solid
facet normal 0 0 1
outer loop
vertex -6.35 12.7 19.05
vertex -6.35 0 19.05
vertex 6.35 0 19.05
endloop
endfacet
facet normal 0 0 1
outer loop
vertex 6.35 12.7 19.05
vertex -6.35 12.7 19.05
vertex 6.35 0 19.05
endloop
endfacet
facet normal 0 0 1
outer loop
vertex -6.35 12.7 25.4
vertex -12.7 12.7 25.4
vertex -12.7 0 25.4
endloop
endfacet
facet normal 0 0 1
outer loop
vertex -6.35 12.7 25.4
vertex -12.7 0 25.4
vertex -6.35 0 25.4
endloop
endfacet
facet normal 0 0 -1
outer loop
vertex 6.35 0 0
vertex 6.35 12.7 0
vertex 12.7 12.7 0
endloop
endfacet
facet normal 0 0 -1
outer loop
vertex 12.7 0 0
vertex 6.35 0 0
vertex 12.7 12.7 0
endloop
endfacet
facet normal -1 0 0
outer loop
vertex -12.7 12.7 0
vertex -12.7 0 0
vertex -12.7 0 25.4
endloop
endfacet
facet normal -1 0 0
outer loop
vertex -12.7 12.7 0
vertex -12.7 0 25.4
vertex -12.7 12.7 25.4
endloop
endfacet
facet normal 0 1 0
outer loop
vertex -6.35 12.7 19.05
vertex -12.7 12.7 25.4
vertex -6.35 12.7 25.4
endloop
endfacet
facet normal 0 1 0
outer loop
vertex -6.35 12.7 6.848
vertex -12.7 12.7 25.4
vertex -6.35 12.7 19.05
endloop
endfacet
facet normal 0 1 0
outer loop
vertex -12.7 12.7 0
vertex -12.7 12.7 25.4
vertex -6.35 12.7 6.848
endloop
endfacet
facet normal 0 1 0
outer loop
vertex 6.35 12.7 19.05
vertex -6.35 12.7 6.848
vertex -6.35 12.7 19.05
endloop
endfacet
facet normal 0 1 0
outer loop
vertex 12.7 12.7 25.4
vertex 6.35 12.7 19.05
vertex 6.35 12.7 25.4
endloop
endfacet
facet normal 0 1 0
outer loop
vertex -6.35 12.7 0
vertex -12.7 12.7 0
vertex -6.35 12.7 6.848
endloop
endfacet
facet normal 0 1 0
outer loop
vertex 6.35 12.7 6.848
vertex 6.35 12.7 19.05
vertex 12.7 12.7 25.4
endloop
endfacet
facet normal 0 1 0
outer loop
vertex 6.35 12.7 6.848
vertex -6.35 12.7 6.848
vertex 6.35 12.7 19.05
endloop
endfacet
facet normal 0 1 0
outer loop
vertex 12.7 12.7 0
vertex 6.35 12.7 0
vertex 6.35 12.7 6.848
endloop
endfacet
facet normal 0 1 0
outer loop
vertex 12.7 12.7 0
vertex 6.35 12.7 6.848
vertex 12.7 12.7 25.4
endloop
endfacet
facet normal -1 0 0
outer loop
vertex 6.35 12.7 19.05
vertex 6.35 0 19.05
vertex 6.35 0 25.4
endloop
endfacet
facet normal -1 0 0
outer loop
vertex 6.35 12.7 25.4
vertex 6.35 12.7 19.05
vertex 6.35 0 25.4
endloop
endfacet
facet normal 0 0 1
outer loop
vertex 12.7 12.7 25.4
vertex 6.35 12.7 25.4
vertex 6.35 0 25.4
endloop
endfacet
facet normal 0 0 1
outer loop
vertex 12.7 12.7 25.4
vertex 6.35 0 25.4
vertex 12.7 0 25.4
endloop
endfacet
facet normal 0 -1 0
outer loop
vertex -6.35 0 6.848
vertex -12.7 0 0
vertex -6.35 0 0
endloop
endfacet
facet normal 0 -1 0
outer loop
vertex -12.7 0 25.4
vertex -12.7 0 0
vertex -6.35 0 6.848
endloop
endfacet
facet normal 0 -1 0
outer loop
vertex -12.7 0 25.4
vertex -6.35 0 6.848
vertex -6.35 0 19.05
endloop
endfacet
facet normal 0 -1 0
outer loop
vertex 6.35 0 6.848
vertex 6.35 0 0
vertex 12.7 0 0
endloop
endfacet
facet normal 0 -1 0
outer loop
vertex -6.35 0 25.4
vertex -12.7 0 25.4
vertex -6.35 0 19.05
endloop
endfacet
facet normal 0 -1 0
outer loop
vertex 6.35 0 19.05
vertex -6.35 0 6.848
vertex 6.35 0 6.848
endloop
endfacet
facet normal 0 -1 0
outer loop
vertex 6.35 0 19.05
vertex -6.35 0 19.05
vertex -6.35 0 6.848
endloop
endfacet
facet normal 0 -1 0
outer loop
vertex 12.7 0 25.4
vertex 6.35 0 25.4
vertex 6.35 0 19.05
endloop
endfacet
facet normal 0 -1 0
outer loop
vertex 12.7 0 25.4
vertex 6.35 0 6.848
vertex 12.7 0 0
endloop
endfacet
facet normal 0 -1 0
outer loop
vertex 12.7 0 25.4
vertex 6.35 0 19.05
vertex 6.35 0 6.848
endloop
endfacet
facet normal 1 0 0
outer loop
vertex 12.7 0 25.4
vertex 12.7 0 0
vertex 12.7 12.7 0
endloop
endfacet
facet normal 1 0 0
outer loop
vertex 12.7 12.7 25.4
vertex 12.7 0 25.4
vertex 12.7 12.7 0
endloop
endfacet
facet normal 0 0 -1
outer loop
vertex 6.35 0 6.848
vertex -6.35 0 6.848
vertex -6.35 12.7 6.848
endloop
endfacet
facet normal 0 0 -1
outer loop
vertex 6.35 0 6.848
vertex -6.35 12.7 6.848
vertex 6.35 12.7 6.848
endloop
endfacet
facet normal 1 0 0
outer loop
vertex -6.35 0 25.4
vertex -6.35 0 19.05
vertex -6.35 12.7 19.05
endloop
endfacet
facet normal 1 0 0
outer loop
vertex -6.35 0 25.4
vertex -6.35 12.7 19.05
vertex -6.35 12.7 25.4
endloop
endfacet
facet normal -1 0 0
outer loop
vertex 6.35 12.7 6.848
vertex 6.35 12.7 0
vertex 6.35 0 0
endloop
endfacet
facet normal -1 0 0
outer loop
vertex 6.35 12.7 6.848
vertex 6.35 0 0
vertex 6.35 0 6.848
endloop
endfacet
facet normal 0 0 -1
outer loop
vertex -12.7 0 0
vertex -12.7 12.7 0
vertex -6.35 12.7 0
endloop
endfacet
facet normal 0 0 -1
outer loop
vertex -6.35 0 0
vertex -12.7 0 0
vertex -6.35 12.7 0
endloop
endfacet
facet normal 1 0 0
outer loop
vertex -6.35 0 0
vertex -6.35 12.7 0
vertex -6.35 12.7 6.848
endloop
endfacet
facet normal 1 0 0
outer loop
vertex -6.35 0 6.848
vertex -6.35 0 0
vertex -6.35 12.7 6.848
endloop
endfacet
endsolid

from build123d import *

# Parameters (mm, degrees)
F0_W     = 25.4
F0_H     = 25.4
F1_DEPTH = 25.4
F2_W     = 12.7
F2_H     = 6.35
F3_DEPTH = 25.4
F4_W     = 12.7
F4_H     = 6.84804
F5_DEPTH = 25.4
F6_DEPTH = 12.7


with BuildPart() as f1:
    # F0 (on Top) → F1 (new body)
    with BuildSketch(Plane.XY):
        Rectangle(F0_W, F0_H)
    extrude(amount=F1_DEPTH)

    # F2 (on face) → F3 (cut)
    with BuildSketch(Plane.XZ.offset(12.7)):
        with Locations((0, 22.225)):
            Rectangle(F2_W, F2_H)
    extrude(amount=-F3_DEPTH, mode=Mode.SUBTRACT)

    # F4 (on face) → F5 (cut)
    with BuildSketch(Plane.XZ.offset(12.7)):
        with Locations((0, 3.42402)):
            Rectangle(F4_W, F4_H)
    extrude(amount=-F5_DEPTH, mode=Mode.SUBTRACT)

    # F1_face (on face) → F6 (cut)
    with BuildSketch(Plane(origin=(0, -12.7, 12.7), x_dir=(1, 0, 0), z_dir=(0, -1, 0))):
        Polygon((-12.7, -12.7), (-6.35, -12.7), (-6.35, -5.85196), (6.35, -5.85196), (6.35, -12.7), (12.7, -12.7), (12.7, 12.7), (6.35, 12.7), (6.35, 6.35), (-6.35, 6.35), (-6.35, 12.7), (-12.7, 12.7), align=None)
    extrude(amount=-F6_DEPTH, mode=Mode.SUBTRACT)


solid = f1.part
